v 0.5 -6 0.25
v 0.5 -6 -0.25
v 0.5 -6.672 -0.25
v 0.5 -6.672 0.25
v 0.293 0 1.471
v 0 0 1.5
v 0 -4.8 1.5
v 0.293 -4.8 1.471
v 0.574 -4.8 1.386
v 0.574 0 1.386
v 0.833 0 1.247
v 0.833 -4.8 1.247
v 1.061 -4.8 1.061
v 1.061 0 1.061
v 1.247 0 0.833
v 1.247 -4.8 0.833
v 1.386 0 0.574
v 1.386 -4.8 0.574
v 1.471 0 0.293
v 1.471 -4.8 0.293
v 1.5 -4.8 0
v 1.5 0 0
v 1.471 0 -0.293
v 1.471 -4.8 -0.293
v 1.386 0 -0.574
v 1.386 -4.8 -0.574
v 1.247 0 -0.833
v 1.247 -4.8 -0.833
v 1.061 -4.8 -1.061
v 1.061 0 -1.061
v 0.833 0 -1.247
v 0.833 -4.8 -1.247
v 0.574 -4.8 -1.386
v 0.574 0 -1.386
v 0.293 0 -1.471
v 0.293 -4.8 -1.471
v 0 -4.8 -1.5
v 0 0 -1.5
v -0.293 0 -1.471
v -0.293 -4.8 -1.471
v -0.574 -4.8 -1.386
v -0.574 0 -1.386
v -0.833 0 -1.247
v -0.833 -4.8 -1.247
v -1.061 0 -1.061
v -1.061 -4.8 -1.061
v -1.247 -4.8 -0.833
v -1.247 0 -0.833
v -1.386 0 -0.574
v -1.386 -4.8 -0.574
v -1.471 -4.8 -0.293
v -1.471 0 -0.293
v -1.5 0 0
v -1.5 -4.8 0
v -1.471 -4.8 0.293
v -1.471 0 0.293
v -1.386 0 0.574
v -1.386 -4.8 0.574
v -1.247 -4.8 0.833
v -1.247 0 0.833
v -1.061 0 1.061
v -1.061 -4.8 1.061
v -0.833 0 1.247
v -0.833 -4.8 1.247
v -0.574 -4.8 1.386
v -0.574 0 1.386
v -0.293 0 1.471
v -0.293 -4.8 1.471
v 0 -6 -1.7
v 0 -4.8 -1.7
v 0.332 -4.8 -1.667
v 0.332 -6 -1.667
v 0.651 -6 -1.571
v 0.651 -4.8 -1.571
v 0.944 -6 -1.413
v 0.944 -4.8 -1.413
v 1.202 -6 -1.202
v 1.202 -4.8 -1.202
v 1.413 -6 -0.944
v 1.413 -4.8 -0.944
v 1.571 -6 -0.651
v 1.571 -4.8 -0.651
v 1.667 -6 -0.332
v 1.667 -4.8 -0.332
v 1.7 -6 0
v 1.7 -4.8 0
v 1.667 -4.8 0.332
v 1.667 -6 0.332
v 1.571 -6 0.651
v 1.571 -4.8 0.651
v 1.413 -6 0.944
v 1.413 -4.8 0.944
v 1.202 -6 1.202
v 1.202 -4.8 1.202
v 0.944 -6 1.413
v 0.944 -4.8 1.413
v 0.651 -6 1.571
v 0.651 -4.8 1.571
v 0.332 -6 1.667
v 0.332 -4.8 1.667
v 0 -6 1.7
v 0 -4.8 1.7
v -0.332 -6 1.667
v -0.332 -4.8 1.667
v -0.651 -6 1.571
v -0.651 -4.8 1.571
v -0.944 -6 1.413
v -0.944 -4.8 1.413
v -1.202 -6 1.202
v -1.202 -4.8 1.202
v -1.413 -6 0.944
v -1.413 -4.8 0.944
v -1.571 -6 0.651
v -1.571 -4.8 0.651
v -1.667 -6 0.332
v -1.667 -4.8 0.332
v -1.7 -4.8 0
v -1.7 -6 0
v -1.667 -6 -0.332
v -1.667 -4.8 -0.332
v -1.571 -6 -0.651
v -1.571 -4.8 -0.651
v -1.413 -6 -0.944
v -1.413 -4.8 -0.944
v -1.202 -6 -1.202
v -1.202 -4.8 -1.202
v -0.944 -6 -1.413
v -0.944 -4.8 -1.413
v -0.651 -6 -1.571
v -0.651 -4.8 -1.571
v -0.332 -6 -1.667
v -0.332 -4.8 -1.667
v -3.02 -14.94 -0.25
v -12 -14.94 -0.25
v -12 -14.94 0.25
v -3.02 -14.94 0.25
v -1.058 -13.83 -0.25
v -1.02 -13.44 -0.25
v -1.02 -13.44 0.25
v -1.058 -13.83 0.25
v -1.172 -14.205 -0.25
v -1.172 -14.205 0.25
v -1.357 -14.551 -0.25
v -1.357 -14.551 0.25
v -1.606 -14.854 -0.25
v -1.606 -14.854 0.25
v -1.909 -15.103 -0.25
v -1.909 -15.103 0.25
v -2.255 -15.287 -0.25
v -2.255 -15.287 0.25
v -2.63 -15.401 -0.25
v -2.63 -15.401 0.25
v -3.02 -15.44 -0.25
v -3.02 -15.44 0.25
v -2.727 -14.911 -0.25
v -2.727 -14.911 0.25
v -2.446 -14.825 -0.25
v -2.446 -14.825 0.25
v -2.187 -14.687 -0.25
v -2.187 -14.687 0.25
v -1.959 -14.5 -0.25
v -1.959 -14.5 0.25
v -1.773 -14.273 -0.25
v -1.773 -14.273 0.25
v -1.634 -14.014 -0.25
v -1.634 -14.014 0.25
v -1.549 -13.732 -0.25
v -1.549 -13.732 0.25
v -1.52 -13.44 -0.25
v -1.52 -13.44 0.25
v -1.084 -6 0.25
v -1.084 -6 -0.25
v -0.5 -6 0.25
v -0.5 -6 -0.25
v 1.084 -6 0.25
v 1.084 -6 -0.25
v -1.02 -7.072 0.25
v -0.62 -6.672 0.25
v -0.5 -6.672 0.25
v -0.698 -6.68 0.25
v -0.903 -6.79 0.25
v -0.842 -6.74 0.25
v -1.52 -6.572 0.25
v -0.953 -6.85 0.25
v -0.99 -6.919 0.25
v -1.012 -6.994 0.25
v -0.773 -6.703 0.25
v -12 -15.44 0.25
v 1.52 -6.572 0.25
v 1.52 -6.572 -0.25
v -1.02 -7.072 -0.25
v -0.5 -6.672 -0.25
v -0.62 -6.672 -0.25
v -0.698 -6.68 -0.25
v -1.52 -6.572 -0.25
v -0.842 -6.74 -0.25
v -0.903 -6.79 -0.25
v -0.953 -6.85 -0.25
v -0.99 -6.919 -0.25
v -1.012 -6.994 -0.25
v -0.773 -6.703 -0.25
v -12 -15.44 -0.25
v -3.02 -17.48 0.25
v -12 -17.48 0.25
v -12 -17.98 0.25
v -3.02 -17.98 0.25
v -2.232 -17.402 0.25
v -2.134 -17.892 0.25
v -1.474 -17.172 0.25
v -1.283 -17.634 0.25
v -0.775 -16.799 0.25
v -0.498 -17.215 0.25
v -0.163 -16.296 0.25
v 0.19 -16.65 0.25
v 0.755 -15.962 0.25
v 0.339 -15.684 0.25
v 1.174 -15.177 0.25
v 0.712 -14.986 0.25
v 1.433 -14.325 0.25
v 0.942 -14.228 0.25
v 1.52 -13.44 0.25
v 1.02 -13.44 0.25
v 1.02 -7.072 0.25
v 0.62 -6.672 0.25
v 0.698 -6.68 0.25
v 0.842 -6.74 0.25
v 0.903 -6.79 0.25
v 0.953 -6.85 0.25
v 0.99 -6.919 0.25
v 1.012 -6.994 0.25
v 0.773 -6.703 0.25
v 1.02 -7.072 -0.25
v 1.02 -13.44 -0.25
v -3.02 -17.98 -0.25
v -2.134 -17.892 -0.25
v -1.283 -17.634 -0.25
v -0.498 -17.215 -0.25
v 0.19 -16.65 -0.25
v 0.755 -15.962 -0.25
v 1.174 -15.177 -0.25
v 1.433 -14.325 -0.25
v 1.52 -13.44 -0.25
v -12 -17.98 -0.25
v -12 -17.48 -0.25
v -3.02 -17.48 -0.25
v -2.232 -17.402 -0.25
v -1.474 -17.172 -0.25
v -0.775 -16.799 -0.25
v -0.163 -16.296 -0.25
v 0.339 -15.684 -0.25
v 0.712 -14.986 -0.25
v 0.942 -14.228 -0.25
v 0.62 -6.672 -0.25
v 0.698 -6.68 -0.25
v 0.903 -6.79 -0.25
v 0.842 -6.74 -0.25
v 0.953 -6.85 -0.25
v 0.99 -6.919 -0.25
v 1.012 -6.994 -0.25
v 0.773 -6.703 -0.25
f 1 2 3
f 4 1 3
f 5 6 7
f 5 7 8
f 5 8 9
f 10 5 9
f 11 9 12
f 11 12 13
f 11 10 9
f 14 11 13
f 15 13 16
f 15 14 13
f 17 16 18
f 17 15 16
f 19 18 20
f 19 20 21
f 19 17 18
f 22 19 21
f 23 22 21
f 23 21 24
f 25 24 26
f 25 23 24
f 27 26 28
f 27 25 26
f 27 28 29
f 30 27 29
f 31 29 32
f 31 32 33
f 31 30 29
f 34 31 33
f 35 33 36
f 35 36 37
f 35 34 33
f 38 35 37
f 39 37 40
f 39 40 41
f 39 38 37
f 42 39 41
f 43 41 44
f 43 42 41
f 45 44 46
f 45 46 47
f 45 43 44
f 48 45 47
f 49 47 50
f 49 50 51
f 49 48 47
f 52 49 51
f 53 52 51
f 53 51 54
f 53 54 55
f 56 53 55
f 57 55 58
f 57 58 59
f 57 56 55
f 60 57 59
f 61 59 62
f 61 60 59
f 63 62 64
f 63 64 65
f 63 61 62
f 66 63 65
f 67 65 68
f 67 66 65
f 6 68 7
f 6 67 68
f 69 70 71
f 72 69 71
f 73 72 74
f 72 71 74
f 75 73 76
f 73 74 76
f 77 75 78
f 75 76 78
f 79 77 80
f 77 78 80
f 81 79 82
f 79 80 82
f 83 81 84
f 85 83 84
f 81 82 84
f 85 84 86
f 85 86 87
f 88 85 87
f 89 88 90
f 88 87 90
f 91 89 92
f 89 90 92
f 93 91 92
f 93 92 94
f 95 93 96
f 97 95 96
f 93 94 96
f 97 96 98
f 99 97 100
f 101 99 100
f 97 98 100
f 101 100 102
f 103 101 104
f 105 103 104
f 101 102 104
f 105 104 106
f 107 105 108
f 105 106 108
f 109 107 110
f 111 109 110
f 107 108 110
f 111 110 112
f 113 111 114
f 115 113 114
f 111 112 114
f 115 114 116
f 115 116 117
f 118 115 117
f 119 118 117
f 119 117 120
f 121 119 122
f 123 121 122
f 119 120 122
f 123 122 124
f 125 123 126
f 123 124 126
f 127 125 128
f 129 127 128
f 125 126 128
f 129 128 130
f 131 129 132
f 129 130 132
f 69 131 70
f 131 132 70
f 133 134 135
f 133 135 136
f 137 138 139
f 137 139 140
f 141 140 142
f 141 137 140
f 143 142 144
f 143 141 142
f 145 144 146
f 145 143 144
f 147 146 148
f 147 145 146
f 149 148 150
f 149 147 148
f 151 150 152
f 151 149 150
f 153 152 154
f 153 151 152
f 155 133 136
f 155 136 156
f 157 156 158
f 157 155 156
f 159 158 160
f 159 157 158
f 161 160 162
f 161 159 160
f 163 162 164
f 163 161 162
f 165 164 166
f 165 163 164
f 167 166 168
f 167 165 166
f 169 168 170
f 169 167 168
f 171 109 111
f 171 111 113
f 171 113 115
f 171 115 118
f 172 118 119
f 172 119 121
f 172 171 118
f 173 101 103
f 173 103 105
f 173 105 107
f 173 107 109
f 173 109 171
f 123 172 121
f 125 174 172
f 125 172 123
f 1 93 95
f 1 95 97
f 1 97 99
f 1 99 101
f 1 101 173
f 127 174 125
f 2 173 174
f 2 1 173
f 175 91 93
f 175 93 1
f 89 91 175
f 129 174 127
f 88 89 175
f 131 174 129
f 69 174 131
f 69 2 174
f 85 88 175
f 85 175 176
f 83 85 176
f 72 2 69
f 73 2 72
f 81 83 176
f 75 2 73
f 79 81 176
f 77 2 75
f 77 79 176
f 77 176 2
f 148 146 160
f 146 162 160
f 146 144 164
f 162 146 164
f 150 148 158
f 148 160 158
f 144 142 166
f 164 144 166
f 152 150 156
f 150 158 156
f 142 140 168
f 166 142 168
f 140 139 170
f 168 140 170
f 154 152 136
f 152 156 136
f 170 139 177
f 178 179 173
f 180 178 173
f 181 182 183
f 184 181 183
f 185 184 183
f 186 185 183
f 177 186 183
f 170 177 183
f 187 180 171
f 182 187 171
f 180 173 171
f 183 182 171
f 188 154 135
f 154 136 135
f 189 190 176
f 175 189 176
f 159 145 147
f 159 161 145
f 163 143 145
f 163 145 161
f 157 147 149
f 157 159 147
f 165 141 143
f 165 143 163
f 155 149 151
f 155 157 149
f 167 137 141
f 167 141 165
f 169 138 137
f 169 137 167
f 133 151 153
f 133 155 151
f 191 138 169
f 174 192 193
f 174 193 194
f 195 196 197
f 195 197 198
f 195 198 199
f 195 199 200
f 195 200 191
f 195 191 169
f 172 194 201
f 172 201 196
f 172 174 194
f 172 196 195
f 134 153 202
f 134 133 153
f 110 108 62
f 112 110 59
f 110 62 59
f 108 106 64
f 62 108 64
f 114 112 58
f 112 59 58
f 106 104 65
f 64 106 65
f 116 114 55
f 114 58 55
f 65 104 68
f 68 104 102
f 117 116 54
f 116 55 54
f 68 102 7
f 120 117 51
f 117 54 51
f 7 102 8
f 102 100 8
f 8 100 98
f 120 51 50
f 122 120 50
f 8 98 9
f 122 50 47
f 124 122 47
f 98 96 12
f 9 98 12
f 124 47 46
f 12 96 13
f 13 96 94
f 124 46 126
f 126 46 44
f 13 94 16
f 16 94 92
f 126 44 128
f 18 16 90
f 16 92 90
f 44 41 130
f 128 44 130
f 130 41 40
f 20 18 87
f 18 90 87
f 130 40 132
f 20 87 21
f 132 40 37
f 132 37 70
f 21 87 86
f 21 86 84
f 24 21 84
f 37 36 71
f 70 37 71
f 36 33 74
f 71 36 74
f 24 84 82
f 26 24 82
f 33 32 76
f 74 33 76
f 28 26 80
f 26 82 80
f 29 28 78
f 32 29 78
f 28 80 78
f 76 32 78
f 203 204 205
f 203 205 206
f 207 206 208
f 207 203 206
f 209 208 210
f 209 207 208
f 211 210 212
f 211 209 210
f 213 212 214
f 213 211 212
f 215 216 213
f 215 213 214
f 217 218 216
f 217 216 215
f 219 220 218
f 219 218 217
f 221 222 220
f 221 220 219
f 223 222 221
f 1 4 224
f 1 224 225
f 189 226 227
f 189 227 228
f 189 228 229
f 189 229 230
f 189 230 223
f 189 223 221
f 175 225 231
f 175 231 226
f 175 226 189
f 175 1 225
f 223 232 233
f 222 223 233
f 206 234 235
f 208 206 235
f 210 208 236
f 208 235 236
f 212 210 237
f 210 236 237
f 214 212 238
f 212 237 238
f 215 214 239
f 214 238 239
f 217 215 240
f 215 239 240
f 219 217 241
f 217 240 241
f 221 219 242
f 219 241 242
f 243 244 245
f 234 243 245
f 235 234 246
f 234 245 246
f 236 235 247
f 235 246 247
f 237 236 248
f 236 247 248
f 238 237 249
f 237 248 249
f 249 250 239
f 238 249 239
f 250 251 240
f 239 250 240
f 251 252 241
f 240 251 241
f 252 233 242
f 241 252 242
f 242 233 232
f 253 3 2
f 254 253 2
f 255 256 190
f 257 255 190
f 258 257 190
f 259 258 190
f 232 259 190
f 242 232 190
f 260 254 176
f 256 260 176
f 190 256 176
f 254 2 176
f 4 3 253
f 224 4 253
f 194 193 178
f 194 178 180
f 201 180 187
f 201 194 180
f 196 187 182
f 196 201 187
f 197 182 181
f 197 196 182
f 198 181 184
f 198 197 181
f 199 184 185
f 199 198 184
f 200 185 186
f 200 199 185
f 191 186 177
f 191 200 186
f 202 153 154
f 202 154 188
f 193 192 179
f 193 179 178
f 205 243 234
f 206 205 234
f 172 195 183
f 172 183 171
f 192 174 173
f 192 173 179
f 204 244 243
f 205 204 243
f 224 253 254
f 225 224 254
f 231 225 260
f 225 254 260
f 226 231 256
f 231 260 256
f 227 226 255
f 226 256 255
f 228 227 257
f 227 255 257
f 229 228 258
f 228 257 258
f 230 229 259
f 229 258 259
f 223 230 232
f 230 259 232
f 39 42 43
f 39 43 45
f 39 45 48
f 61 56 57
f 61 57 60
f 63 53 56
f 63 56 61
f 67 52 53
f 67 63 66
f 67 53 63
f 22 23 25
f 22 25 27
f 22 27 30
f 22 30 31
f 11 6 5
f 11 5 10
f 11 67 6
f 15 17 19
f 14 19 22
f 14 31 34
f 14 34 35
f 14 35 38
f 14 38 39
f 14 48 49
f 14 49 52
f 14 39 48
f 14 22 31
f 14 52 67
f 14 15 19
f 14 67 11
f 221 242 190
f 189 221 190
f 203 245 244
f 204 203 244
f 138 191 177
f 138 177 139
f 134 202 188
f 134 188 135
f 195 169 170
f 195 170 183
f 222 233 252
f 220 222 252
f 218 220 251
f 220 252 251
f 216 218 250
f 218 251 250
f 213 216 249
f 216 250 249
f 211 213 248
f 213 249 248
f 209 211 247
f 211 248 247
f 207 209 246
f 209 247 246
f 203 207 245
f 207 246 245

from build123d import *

# Parameters (mm, degrees)
ESQUISSE1_R             = 1.5
BOSS_EXTRU_1_DEPTH      = 4.8
ESQUISSE2_R             = 1.7
BOSS_EXTRU_2_DEPTH      = 1.2
BOSS_EXTRU_3_DEPTH      = 0.25
BOSS_EXTRU_3_DEPTH_BACK = 0.25


with BuildPart() as part:
    # Esquisse1 → Boss.-Extru.1 (new body)
    with BuildSketch(Plane(origin=(0, 0, 0), x_dir=(1, 0, 0), z_dir=(0, 1, 0))):
        Circle(ESQUISSE1_R)
    extrude(amount=-BOSS_EXTRU_1_DEPTH)

    # Esquisse2 → Boss.-Extru.2 (add)
    with BuildSketch(Plane.XZ.offset(4.8)):
        Circle(ESQUISSE2_R)
    extrude(amount=BOSS_EXTRU_2_DEPTH)

    # Esquisse3 → Boss.-Extru.3 (add, two sides: drawn at the far end of the back side and taken through both)
    with BuildSketch(Plane.XY.offset(-BOSS_EXTRU_3_DEPTH_BACK)):
        with BuildLine():
            Line((0.5, -6), (0.5, -6.672497838))
            Line((0.5, -6.672497838), (0.62, -6.672497838))
            ThreePointArc((0.62, -6.672497838), (0.902842712, -6.789655126), (1.02, -7.072497838))
            Line((1.02, -7.072497838), (1.02, -13.439637098))
            ThreePointArc((1.02, -13.439637098), (-0.163288604, -16.296348494), (-3.02, -17.479637098))
            Line((-3.02, -17.479637098), (-12, -17.479637098))
            Line((-12, -17.479637098), (-12, -17.979637098))
            Line((-12, -17.979637098), (-3.02, -17.979637098))
            ThreePointArc((-3.02, -17.979637098), (0.190264787, -16.649901885), (1.52, -13.439637098))
            Line((1.52, -13.439637098), (1.52, -6.572497838))
            Line((1.52, -6.572497838), (1.084066682, -6))
            Line((1.084066682, -6), (0.5, -6))
        make_face()
        with BuildLine():
            Line((-1.084066682, -6), (-0.5, -6))
            Line((-0.5, -6), (-0.5, -6.672497838))
            Line((-0.5, -6.672497838), (-0.62, -6.672497838))
            ThreePointArc((-0.62, -6.672497838), (-0.902842712, -6.789655126), (-1.02, -7.072497838))
            Line((-1.02, -7.072497838), (-1.02, -13.439637098))
            ThreePointArc((-1.02, -13.439637098), (-1.605786438, -14.85385066), (-3.02, -15.439637098))
            Line((-3.02, -15.439637098), (-12, -15.439637098))
            Line((-12, -15.439637098), (-12, -14.939637098))
            Line((-12, -14.939637098), (-3.02, -14.939637098))
            ThreePointArc((-3.02, -14.939637098), (-1.959339828, -14.50029727), (-1.52, -13.439637098))
            Line((-1.52, -13.439637098), (-1.52, -6.572497838))
            Line((-1.52, -6.572497838), (-1.084066682, -6))
        make_face()
    extrude(amount=BOSS_EXTRU_3_DEPTH + BOSS_EXTRU_3_DEPTH_BACK)


solid = part.part
